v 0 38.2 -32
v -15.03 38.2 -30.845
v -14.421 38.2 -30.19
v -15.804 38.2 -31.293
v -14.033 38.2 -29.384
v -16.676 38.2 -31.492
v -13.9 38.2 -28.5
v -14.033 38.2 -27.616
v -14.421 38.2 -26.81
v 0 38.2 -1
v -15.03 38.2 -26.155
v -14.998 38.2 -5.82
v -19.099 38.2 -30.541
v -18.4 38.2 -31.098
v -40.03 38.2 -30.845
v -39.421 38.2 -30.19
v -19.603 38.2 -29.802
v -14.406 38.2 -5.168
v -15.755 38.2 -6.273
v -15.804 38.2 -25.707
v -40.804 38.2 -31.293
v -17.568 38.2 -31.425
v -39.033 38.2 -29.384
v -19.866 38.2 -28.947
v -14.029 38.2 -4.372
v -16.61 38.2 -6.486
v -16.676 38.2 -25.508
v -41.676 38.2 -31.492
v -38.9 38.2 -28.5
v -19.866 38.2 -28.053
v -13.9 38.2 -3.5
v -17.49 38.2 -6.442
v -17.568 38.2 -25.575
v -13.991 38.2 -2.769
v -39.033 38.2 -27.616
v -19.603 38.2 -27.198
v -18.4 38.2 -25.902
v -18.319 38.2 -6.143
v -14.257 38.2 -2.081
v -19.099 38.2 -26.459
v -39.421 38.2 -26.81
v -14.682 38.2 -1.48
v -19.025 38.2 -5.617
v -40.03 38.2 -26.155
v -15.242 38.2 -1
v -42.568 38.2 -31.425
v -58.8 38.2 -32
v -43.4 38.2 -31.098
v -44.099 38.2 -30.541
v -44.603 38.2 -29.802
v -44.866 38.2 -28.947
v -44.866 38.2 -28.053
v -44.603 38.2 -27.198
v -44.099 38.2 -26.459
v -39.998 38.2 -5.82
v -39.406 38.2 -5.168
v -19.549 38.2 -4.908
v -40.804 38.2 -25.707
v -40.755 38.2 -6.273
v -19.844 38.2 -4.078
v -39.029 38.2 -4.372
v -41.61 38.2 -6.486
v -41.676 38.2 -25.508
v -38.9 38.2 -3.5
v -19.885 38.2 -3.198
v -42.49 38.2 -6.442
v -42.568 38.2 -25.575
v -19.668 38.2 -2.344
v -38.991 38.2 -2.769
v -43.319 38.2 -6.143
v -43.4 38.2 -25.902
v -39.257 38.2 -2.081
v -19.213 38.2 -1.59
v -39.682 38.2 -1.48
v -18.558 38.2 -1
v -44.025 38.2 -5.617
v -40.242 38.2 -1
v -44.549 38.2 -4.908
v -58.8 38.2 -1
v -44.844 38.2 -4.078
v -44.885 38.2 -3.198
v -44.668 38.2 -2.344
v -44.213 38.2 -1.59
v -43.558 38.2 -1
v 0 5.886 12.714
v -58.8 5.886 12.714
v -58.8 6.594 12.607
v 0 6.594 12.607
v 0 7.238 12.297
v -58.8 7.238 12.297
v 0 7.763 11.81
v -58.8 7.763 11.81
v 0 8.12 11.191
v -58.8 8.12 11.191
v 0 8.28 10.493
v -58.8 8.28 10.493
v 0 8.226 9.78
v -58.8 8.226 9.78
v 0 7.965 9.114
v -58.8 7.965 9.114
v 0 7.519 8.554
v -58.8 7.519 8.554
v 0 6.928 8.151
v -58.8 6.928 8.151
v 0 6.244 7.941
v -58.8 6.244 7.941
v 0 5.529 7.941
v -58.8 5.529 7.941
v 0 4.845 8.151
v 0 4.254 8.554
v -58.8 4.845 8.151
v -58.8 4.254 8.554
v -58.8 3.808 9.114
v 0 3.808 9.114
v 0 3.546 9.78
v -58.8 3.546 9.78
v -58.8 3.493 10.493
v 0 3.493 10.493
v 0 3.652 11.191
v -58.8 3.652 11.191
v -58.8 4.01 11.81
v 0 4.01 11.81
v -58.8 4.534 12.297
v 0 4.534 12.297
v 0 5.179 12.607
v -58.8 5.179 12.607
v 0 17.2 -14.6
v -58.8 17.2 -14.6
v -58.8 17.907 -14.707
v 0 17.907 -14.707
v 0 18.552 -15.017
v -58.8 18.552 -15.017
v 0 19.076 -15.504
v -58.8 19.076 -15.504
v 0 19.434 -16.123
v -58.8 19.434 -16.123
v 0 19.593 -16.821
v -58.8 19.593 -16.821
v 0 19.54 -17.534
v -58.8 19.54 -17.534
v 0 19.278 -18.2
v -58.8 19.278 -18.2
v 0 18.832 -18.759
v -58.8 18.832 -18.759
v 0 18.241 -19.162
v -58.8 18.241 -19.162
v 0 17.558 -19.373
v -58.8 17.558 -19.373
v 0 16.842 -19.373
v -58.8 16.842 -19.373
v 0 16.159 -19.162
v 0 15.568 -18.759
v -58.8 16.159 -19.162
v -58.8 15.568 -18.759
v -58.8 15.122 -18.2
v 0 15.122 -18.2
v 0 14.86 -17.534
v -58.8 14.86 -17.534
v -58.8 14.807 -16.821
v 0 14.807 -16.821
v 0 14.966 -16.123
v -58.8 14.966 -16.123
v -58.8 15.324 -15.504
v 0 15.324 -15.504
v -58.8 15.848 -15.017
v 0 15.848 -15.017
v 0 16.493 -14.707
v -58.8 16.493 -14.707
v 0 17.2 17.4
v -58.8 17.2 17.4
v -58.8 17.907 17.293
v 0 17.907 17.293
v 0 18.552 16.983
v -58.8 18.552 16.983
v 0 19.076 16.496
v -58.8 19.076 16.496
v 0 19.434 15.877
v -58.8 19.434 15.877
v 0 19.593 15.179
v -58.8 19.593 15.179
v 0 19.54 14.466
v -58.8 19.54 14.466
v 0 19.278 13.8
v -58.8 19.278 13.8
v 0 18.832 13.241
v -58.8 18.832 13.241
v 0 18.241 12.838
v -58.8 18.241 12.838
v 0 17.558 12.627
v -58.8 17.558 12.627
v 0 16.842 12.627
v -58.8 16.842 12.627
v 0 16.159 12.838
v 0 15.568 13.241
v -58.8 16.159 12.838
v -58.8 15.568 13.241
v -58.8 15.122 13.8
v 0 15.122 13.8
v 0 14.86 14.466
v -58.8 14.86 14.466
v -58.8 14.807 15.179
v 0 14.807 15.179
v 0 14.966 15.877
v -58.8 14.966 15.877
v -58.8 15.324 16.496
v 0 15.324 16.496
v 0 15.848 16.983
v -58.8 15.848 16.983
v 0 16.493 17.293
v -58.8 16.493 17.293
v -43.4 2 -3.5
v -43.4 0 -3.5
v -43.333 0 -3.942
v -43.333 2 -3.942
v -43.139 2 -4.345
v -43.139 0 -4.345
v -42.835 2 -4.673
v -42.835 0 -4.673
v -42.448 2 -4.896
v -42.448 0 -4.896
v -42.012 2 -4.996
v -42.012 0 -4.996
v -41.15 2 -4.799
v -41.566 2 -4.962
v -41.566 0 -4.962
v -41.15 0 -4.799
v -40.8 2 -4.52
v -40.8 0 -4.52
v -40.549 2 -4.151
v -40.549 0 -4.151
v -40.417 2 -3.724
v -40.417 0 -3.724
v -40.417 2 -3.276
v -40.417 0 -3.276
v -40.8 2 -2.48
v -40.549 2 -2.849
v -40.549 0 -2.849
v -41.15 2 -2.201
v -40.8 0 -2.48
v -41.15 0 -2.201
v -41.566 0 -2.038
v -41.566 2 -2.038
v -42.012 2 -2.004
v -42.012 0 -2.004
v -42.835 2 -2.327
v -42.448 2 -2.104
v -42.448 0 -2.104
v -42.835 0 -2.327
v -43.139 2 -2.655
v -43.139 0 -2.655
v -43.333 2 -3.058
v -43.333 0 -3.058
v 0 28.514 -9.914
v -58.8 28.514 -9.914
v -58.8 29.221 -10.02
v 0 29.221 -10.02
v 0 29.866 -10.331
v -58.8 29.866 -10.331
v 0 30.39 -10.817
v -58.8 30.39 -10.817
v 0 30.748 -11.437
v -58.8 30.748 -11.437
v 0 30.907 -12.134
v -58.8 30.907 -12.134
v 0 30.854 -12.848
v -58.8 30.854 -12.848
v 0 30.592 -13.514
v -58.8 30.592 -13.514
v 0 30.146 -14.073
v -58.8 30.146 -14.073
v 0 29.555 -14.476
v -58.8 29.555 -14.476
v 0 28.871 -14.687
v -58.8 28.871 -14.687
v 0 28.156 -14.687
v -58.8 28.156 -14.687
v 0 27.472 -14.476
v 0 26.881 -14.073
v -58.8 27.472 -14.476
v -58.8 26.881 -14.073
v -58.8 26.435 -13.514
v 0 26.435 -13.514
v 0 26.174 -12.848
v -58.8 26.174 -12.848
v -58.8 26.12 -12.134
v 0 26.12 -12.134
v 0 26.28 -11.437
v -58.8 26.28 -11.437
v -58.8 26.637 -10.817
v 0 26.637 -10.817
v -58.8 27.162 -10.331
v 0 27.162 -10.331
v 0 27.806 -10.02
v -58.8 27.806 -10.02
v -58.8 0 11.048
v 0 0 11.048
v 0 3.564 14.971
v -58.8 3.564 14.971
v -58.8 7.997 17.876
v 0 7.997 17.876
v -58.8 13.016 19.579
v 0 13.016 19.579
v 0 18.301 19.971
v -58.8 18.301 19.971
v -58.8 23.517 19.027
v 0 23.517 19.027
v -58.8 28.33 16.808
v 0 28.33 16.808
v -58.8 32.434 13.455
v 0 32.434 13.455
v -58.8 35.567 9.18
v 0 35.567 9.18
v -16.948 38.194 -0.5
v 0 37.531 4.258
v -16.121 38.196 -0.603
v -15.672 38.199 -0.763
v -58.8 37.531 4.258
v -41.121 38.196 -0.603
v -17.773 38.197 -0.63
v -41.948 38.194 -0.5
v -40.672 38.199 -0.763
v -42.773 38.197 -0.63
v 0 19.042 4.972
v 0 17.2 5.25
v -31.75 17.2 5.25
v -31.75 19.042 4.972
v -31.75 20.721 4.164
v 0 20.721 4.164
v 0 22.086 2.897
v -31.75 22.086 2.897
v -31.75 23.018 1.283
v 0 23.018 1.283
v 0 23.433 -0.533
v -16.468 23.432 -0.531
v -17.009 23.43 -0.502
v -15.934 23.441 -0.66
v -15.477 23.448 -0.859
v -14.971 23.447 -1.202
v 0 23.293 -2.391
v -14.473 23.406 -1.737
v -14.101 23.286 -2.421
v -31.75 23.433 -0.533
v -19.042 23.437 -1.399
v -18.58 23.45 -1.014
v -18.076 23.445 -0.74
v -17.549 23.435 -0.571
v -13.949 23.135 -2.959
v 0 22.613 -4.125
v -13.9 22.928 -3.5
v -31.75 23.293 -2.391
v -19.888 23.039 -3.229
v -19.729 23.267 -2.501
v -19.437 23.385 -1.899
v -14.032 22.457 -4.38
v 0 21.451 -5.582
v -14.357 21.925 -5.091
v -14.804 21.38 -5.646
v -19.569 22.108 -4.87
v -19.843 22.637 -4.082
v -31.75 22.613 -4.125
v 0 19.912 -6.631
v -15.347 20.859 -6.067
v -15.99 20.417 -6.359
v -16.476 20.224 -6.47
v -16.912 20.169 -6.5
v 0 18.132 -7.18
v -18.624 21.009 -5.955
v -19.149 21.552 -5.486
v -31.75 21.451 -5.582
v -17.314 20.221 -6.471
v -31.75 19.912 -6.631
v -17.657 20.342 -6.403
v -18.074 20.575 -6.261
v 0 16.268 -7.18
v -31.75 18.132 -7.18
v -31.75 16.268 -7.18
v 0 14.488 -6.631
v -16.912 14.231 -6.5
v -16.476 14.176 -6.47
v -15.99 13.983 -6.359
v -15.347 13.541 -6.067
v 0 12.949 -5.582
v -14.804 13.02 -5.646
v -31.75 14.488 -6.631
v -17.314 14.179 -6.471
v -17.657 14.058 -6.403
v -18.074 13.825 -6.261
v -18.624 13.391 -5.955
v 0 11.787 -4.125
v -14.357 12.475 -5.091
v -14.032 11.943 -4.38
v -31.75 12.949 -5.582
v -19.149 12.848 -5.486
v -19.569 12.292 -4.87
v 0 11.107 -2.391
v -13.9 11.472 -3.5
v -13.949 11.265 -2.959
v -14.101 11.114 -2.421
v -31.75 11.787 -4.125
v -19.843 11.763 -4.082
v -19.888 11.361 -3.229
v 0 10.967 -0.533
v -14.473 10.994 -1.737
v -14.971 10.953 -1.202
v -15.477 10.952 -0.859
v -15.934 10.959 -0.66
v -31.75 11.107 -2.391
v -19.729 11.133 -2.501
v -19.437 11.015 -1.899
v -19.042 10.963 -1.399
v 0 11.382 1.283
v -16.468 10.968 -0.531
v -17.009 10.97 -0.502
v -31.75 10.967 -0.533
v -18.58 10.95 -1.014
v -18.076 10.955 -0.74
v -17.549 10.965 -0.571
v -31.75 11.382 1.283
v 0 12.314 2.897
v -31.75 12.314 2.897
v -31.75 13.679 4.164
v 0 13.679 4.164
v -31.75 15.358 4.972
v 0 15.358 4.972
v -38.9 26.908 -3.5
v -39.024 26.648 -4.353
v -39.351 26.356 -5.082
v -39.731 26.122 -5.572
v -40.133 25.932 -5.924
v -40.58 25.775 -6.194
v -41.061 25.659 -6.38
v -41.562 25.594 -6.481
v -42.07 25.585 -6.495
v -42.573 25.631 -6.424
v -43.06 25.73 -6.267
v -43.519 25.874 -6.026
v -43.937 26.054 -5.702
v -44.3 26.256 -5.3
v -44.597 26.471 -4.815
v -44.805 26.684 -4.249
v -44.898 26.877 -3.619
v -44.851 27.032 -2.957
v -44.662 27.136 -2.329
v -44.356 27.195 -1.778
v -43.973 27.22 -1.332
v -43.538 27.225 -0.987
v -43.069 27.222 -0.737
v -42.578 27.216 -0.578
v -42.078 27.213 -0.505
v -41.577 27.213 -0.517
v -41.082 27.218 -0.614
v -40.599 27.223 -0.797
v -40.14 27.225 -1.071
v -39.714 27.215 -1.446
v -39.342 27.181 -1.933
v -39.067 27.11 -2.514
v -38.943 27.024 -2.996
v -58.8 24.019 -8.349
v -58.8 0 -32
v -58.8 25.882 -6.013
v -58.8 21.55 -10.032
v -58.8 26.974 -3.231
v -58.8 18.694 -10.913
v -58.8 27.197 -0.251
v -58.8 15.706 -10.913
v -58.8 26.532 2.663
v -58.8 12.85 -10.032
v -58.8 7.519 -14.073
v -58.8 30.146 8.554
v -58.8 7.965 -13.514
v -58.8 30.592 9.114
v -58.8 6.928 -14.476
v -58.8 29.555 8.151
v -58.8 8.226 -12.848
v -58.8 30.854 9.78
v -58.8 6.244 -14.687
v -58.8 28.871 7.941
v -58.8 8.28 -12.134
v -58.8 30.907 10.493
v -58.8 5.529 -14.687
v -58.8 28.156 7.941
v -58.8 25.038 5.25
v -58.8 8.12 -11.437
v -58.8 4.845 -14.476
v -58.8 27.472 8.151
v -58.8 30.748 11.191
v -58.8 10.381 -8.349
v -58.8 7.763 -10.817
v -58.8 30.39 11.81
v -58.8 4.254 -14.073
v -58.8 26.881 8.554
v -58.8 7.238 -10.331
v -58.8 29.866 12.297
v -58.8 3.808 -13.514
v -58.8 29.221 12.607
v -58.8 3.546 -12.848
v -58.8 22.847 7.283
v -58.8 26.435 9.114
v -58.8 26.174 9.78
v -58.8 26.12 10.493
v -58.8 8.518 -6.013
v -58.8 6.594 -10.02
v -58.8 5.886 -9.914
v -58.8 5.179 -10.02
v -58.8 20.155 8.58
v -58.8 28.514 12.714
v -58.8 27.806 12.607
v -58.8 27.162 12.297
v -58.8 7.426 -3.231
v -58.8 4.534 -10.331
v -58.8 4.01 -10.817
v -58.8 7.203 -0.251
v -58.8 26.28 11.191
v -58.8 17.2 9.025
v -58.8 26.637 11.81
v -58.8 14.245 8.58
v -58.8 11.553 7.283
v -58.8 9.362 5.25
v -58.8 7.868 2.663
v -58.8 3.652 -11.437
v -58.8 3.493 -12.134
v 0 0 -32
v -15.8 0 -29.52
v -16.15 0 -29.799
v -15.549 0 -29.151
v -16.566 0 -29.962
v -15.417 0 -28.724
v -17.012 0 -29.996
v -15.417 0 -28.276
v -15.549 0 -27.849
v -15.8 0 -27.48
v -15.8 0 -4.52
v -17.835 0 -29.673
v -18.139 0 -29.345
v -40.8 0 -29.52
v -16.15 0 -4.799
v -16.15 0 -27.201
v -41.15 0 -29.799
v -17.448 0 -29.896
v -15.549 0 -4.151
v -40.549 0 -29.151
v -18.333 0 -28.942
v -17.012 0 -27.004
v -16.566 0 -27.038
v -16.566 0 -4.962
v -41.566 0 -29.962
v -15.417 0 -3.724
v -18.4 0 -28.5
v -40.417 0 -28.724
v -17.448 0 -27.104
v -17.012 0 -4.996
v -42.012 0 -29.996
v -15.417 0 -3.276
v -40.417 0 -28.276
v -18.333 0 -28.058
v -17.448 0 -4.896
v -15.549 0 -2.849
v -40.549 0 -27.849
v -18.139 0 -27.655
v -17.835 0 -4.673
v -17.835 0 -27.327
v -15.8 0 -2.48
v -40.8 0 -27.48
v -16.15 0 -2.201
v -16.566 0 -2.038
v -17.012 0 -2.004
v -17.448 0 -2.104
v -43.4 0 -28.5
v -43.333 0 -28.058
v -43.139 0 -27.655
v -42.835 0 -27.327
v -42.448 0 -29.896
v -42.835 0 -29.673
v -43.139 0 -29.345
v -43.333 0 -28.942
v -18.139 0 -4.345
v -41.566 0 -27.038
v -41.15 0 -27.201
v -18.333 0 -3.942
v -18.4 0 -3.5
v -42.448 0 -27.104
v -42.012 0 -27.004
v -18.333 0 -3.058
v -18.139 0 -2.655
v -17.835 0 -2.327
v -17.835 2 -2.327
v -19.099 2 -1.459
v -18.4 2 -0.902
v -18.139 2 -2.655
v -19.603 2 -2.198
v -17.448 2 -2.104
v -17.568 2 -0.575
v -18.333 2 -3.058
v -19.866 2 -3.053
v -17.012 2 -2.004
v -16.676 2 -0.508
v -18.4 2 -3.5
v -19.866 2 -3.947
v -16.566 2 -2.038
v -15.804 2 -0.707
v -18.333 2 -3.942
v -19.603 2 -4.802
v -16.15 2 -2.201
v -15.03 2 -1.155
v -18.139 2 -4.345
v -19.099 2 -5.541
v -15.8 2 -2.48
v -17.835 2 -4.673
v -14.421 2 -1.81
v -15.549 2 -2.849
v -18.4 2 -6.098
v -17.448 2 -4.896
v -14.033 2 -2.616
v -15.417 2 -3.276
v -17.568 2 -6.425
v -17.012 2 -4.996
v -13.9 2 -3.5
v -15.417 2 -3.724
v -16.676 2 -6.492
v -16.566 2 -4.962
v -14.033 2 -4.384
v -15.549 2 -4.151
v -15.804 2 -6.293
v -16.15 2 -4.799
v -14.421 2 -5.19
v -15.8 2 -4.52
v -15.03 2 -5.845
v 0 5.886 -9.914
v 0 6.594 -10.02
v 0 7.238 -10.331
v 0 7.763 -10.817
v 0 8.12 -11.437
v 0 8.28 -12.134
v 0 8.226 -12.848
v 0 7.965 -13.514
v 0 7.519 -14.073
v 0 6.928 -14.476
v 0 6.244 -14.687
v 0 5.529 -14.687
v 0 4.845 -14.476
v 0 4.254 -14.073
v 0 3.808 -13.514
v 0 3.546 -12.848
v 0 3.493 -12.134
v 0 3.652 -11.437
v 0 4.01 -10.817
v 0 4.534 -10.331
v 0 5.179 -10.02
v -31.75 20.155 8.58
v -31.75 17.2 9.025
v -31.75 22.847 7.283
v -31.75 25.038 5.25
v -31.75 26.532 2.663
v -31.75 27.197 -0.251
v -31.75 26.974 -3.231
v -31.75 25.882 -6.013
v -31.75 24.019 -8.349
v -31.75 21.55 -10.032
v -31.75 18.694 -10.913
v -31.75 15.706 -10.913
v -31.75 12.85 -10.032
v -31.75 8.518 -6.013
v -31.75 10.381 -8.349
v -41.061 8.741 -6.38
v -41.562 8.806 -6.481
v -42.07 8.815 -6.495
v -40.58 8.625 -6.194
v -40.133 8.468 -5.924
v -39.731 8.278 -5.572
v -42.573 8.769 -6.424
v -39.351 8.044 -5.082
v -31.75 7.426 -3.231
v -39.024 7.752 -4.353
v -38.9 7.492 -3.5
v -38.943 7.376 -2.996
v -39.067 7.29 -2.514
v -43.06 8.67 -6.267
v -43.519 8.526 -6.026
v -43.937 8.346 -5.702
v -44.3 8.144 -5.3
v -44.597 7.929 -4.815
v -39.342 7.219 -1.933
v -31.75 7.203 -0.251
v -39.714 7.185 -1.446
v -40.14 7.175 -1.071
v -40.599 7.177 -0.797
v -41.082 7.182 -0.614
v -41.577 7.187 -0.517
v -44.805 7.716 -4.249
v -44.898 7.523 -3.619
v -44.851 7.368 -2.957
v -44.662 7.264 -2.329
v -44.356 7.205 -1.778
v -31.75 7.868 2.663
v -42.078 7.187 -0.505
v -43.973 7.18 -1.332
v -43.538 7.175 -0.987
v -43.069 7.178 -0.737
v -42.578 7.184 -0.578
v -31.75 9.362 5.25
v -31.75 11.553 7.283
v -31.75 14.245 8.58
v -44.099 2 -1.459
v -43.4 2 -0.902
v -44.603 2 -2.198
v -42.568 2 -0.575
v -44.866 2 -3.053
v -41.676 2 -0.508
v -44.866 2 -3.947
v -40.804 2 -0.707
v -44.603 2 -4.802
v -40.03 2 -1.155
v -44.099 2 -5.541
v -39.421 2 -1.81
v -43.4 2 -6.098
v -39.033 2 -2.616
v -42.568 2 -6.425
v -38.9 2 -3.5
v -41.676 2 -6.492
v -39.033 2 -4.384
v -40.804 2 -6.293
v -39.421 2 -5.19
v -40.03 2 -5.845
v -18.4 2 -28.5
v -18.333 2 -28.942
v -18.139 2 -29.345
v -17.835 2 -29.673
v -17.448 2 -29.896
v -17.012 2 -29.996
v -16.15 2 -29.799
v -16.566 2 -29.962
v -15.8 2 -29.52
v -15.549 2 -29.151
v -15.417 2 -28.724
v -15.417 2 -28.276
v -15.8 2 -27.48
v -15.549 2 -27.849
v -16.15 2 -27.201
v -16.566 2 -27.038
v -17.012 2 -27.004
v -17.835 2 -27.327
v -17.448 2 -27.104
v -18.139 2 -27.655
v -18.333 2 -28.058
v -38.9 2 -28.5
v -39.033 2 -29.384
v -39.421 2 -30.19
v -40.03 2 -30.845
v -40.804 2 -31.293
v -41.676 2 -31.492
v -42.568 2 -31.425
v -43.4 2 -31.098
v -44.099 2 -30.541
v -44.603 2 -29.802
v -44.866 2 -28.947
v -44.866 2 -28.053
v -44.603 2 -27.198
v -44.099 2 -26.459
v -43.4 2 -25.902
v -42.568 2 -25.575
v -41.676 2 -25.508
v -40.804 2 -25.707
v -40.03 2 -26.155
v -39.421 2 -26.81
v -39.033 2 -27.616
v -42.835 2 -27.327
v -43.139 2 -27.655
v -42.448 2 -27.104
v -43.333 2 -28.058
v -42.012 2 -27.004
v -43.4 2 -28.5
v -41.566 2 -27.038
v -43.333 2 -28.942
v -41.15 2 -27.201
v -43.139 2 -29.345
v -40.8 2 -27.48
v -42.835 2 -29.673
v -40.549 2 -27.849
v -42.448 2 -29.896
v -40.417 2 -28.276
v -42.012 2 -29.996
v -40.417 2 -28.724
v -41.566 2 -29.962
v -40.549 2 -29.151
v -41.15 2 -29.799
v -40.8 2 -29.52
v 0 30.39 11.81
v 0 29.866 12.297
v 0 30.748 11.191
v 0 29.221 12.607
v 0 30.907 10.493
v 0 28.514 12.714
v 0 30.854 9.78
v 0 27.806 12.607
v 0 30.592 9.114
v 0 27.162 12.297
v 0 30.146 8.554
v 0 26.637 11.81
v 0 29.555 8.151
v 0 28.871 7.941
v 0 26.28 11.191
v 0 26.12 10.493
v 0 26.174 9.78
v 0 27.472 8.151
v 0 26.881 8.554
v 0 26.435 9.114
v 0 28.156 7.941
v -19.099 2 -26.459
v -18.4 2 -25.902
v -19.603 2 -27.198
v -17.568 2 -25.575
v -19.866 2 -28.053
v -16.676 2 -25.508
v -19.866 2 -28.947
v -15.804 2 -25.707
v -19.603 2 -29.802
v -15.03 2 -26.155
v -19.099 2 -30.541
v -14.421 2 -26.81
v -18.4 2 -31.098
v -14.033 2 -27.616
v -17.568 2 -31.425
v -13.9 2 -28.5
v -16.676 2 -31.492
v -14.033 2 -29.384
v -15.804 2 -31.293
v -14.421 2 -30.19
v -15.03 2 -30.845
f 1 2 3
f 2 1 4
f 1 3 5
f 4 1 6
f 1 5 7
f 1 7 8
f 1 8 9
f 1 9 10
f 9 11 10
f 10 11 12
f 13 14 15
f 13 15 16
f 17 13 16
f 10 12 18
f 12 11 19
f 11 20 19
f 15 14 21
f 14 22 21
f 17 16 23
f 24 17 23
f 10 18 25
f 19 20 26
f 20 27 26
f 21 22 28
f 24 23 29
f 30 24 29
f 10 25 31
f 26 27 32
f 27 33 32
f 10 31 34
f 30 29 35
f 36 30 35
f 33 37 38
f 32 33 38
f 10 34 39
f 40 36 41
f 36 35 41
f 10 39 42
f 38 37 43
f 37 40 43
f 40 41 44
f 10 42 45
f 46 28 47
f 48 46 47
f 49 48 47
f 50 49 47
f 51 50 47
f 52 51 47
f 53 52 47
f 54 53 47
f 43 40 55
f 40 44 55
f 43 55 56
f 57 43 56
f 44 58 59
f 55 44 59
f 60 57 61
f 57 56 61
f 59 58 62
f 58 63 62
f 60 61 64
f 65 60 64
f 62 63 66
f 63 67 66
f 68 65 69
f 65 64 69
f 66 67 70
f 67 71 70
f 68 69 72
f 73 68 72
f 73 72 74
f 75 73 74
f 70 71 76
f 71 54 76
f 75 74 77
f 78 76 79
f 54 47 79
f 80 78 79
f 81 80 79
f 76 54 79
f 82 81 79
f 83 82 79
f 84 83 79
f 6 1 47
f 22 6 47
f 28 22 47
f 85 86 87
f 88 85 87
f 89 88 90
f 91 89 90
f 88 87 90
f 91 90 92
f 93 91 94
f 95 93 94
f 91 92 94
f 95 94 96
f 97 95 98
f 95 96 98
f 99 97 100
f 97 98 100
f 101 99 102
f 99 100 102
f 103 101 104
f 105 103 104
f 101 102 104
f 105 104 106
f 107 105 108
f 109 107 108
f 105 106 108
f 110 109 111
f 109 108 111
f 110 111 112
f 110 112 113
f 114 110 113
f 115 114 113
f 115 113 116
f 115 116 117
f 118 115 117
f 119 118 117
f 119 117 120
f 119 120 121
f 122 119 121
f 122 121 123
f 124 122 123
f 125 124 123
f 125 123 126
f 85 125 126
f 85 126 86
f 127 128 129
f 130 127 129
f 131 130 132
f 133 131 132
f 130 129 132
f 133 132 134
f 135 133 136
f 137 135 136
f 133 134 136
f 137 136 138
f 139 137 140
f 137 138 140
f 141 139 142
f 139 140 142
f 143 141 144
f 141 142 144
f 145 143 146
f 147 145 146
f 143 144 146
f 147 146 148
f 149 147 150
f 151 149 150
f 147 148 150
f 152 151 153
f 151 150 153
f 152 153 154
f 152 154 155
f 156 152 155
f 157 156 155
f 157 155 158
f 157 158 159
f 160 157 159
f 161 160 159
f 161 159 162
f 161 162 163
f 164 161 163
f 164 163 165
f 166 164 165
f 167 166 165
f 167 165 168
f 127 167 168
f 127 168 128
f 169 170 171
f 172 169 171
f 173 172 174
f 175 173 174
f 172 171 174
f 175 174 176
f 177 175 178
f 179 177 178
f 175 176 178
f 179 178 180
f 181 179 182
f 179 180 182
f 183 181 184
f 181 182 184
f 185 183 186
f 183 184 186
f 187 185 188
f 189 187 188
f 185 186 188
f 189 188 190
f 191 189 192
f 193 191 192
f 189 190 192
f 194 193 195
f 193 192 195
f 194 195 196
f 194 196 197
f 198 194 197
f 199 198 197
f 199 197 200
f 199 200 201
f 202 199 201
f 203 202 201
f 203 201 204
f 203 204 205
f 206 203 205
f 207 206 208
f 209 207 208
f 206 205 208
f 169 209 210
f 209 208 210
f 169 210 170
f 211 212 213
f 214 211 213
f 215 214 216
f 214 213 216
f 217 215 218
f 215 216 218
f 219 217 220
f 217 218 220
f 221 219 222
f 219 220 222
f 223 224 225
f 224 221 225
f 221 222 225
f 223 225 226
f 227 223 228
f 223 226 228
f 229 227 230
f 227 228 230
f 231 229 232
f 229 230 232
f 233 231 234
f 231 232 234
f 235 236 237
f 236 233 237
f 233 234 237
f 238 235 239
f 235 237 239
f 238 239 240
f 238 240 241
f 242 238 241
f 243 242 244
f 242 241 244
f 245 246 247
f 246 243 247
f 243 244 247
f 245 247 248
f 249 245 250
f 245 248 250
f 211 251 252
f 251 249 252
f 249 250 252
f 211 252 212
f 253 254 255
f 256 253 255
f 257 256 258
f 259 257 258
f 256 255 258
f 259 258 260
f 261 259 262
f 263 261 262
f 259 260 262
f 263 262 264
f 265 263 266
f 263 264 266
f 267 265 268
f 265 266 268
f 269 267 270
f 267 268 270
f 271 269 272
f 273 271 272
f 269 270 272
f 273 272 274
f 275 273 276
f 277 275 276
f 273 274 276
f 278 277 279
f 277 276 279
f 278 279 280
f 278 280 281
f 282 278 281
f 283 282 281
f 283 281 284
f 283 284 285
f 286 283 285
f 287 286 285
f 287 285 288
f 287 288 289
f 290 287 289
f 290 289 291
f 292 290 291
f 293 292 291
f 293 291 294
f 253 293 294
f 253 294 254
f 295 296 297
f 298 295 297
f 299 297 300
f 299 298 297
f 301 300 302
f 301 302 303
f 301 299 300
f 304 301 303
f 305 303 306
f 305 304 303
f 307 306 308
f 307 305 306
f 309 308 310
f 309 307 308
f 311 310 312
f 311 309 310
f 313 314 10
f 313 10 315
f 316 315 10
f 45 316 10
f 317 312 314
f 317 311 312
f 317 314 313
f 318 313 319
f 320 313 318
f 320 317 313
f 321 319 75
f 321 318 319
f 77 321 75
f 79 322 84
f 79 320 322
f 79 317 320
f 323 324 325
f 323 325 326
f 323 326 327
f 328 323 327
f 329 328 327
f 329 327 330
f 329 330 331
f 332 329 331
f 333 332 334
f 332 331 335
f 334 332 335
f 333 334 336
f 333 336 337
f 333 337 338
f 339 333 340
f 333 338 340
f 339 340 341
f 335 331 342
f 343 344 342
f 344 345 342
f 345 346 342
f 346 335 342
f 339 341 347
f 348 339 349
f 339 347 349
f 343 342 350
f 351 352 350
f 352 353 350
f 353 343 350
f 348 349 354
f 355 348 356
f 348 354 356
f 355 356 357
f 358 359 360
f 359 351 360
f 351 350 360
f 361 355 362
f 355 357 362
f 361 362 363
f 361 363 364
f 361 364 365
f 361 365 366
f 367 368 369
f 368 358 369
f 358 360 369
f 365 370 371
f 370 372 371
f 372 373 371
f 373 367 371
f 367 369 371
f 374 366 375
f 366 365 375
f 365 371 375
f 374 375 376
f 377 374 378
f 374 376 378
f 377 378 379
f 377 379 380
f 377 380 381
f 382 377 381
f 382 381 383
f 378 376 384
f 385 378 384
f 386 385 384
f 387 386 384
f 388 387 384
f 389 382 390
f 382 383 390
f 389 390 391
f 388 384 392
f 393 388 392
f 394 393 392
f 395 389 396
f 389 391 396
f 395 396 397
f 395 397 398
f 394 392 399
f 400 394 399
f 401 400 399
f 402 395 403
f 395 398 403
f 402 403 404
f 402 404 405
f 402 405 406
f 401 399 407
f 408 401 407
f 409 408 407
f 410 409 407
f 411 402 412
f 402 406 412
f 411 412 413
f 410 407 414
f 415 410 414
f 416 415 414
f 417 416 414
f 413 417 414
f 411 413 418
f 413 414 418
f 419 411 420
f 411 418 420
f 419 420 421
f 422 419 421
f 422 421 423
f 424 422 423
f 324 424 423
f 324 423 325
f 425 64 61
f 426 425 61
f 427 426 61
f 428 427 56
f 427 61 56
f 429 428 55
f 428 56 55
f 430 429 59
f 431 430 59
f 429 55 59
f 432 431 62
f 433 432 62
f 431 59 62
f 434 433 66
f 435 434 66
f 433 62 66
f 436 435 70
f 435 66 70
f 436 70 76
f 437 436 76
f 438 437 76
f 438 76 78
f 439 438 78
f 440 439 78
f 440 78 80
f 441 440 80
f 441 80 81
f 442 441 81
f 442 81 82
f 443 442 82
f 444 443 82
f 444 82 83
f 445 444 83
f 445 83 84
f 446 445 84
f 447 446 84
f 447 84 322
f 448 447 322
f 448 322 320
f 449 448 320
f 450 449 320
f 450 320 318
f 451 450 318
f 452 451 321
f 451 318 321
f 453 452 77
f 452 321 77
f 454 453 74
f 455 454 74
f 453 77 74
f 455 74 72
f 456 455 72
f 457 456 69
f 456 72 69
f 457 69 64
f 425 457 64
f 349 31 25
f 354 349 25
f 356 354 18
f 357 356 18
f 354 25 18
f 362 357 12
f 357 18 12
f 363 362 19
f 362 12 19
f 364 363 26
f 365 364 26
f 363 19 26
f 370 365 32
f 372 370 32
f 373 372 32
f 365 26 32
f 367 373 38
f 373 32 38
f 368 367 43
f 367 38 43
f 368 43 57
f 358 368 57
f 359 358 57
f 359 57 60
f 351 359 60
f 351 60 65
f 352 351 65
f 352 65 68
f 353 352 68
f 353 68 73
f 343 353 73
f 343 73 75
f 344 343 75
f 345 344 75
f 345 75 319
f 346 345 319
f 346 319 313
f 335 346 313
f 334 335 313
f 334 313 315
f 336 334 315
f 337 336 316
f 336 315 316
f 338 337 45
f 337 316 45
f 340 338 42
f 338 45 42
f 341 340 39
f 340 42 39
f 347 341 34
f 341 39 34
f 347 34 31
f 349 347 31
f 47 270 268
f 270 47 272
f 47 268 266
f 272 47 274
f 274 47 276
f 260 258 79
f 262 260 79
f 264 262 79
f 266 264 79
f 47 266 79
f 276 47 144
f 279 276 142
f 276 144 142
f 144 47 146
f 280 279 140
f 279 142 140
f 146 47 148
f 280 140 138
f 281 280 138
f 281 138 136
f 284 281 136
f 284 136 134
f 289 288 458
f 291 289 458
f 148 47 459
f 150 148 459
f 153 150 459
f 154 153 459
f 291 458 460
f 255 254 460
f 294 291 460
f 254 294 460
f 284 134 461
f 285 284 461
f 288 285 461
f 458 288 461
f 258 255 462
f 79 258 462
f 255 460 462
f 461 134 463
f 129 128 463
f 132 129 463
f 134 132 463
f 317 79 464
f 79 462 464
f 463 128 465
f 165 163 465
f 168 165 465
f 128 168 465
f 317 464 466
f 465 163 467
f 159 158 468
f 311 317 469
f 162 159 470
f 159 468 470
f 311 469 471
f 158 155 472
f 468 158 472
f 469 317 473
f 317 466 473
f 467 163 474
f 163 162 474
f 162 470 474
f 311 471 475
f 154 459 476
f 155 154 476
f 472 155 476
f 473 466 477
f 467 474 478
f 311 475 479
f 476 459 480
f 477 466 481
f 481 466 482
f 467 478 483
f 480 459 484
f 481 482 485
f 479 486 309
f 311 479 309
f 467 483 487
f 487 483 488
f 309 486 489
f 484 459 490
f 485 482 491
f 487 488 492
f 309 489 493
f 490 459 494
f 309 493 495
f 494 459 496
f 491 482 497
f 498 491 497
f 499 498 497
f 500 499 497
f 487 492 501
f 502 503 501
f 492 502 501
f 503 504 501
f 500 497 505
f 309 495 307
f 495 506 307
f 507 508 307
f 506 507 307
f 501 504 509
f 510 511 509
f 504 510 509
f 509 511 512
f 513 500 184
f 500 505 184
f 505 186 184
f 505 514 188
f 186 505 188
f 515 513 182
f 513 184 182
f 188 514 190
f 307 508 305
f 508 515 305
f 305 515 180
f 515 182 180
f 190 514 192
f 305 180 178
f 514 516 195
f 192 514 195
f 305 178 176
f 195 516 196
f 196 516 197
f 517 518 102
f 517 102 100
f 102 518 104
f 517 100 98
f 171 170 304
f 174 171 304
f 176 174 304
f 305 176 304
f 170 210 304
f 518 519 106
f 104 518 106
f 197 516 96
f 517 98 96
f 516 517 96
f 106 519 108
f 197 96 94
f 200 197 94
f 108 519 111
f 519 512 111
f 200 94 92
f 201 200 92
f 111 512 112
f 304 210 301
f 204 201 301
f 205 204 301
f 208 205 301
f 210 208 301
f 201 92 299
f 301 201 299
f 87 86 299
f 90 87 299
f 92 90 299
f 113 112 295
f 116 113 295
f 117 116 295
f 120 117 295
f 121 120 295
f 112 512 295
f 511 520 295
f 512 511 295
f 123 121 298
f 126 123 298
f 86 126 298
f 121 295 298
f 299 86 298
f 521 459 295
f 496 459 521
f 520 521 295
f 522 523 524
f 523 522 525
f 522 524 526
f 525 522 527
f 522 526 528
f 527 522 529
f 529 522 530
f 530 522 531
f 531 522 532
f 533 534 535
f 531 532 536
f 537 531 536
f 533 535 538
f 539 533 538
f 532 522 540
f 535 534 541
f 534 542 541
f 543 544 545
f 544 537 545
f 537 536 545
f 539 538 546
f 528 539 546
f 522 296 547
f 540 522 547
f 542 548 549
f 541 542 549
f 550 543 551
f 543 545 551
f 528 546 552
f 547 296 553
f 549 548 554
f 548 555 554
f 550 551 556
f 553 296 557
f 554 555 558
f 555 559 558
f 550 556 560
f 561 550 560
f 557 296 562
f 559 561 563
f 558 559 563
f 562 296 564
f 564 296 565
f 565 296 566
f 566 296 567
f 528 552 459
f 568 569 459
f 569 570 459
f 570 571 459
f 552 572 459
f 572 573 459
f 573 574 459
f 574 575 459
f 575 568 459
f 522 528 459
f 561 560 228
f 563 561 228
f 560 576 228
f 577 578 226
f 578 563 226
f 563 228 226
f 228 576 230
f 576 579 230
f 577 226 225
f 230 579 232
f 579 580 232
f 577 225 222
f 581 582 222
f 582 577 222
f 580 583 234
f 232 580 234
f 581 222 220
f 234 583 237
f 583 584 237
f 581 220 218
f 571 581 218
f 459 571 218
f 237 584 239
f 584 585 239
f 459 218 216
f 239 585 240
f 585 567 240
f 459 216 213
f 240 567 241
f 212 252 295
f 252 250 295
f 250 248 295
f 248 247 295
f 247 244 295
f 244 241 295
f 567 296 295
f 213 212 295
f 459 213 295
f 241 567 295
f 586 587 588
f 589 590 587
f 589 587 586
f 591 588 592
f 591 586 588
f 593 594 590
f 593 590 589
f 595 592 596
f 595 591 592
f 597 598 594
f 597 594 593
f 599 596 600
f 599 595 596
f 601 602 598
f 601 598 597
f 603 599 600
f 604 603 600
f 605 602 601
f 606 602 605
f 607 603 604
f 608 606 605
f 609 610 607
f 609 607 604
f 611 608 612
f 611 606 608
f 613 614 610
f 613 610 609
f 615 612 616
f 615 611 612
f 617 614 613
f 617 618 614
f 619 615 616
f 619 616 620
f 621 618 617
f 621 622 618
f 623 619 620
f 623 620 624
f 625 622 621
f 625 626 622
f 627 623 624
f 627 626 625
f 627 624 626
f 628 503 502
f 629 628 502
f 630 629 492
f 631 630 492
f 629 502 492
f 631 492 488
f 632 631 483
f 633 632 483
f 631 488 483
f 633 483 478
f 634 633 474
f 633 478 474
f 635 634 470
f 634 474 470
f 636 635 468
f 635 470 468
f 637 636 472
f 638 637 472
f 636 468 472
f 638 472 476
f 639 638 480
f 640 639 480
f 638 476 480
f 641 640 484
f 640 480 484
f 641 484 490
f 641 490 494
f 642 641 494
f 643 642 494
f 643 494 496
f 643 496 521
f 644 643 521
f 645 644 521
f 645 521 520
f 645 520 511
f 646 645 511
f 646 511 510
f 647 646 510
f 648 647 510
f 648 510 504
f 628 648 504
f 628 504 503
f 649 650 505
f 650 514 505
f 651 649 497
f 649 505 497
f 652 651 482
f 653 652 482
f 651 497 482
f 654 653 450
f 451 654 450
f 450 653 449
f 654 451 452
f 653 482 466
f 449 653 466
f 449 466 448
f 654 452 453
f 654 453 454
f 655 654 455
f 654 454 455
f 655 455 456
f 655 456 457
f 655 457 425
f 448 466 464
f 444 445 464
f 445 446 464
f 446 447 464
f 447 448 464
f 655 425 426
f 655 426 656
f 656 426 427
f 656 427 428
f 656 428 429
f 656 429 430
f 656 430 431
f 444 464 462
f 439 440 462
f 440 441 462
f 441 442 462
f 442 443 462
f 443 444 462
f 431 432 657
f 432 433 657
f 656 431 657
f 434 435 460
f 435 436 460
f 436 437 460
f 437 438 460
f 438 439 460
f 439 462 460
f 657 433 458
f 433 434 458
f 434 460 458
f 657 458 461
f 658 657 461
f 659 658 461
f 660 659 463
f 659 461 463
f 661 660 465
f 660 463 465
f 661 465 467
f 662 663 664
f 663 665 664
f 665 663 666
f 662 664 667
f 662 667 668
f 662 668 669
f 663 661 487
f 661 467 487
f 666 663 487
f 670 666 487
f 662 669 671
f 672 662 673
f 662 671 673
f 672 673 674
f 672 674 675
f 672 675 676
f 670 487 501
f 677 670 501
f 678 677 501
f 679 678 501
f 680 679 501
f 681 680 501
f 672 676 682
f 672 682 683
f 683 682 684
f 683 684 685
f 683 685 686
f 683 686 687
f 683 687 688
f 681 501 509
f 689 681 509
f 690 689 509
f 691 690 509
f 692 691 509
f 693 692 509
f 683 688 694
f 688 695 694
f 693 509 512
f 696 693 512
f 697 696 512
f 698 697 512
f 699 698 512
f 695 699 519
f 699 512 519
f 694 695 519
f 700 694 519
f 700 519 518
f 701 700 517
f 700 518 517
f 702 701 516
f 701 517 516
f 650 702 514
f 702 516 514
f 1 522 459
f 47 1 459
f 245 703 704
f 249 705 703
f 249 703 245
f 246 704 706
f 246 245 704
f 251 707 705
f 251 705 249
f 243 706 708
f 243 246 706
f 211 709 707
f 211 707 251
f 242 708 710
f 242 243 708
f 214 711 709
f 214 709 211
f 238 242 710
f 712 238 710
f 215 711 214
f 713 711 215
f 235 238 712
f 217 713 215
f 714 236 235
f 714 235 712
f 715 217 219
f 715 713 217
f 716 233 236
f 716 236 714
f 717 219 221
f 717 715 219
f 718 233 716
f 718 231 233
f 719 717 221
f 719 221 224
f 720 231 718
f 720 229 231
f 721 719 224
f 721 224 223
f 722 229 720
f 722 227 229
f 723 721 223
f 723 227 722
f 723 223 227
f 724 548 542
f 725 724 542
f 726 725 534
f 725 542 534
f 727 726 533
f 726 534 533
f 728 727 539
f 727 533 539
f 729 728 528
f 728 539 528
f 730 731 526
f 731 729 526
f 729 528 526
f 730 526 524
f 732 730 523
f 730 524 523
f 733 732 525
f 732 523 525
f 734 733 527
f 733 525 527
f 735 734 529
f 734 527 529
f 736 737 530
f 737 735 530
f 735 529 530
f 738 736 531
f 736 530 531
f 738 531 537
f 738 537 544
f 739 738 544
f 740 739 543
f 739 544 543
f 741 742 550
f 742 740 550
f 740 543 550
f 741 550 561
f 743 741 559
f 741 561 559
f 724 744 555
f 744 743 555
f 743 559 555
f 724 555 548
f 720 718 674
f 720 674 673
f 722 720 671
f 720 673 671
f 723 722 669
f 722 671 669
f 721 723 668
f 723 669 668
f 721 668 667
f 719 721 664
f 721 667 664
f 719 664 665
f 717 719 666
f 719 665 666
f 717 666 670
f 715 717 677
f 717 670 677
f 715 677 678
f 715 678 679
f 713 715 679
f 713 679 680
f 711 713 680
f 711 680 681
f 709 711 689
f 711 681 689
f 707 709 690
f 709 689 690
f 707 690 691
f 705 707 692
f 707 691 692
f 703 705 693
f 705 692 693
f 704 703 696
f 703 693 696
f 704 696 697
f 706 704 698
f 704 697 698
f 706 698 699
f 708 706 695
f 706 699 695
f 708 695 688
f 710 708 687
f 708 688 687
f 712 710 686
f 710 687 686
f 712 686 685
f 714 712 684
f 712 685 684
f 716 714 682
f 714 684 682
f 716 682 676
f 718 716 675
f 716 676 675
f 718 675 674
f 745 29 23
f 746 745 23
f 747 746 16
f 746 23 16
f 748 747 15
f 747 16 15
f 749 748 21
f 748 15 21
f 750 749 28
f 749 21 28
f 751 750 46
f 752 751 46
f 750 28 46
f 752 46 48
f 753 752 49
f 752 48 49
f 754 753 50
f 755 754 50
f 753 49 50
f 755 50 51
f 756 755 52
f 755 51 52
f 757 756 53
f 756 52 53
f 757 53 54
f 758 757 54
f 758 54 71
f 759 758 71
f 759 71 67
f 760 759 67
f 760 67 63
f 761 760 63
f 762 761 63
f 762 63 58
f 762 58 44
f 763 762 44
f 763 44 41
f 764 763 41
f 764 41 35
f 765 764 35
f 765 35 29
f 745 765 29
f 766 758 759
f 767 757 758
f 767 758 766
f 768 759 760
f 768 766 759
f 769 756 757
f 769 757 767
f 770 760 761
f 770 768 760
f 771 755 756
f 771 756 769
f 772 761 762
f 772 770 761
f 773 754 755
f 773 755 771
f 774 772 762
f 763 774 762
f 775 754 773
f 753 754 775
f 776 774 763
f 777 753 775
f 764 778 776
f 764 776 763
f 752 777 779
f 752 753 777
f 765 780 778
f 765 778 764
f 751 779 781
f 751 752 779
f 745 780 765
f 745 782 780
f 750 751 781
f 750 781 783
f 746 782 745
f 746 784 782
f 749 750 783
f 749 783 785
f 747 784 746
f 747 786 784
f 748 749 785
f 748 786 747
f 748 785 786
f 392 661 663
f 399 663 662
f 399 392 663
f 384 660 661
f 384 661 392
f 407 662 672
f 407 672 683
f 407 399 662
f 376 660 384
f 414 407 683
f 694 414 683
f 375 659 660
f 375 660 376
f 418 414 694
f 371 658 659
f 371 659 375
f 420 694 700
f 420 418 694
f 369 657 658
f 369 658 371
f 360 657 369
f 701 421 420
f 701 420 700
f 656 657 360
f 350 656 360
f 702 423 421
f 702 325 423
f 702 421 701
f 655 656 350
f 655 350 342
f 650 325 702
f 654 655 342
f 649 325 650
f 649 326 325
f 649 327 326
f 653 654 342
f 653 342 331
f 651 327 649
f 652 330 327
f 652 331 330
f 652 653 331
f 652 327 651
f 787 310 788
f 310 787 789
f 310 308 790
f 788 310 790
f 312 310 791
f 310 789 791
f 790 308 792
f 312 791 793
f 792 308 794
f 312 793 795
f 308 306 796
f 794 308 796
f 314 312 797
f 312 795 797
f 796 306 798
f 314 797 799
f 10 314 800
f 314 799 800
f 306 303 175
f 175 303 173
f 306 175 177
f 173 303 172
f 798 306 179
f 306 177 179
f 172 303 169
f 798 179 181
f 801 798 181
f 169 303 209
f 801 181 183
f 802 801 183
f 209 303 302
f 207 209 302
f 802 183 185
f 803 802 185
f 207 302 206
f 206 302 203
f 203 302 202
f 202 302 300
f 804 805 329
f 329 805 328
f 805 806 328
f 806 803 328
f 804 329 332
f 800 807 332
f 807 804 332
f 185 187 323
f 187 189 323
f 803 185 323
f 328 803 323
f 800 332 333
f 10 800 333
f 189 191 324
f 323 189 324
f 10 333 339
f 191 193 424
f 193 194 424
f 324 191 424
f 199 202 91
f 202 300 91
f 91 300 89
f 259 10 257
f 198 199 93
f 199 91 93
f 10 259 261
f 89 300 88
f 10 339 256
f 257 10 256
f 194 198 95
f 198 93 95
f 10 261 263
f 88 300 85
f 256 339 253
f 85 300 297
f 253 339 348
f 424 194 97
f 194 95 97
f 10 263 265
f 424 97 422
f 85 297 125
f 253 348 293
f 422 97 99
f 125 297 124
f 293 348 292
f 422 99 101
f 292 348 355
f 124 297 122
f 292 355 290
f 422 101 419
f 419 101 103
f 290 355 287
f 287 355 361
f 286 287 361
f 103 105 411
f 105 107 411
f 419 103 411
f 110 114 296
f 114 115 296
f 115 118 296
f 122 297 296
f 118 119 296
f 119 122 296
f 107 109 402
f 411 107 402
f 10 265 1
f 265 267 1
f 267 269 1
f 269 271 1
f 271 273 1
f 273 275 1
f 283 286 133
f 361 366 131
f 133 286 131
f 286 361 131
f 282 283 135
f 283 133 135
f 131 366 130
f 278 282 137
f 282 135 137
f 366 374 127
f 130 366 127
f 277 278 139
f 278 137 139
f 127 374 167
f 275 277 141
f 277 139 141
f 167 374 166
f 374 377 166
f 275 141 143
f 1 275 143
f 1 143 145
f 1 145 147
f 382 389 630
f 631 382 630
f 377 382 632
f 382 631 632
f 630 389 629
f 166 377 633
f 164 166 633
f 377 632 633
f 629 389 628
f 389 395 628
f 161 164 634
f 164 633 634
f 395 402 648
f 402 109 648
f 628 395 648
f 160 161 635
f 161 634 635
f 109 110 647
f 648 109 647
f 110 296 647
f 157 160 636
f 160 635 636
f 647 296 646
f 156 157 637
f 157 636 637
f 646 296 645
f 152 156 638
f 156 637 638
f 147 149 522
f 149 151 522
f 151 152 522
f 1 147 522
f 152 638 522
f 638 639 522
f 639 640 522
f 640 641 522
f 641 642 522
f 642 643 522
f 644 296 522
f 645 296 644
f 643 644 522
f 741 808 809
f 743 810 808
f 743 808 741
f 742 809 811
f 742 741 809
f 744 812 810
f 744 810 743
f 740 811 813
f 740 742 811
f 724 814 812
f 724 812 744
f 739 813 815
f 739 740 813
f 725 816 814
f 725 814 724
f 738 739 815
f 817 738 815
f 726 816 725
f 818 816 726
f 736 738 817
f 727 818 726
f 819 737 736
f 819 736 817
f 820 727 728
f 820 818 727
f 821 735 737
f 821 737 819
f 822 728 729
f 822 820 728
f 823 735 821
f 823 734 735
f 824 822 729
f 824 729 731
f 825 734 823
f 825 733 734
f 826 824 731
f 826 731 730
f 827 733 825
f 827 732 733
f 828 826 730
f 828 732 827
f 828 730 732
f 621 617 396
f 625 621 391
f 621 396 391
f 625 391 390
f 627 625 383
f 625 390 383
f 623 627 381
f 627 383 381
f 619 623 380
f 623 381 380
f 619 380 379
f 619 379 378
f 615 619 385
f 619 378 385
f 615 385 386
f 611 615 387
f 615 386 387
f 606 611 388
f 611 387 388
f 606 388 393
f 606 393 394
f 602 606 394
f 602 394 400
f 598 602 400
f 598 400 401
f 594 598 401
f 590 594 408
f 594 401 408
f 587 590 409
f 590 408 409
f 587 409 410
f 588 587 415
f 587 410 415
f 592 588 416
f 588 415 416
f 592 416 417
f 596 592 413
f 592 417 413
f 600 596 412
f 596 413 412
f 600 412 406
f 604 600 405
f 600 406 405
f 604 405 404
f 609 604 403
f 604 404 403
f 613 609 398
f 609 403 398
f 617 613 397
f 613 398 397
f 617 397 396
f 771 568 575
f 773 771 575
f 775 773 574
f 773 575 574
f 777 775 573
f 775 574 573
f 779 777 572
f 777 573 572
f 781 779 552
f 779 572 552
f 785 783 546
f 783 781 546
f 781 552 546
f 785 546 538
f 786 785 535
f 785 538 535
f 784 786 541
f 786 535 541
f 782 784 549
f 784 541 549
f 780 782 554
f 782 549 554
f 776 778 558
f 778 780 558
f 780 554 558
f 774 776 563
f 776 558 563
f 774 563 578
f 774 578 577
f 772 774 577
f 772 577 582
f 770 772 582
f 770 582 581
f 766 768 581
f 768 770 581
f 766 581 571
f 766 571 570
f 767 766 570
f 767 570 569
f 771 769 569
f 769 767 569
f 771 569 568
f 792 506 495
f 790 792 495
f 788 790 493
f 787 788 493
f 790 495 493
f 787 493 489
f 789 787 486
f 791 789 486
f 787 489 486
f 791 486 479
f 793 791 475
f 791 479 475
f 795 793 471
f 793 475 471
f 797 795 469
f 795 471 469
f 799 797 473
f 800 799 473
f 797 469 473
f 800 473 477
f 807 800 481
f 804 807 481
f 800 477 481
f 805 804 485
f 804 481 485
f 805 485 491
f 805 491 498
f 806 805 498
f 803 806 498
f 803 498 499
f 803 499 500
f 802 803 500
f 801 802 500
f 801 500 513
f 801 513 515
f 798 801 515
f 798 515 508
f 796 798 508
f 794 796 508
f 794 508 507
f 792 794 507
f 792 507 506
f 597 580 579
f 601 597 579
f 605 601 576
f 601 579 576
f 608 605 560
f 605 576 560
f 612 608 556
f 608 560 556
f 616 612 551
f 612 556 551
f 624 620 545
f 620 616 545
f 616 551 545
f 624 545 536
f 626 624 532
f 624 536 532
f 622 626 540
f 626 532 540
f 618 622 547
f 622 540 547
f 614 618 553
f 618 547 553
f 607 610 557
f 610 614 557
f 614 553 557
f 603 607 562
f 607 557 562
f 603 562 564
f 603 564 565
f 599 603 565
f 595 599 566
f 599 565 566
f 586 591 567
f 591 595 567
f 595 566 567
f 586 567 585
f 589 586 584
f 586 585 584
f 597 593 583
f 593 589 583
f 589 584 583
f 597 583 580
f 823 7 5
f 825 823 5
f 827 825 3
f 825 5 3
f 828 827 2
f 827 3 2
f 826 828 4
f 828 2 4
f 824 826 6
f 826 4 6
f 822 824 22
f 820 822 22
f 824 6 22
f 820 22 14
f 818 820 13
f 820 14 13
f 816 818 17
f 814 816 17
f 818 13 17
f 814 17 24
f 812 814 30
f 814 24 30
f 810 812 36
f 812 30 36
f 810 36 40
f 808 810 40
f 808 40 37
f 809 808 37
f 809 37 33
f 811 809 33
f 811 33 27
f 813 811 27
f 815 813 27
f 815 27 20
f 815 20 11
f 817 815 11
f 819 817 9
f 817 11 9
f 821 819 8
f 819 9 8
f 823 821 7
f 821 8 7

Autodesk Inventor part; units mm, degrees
ref_plane "YZ Plane" through (0, 0, 0) normal (1, 0, 0) x (0, 1, 0)
ref_plane "XZ Plane" through (0, 0, 0) normal (0, 1, 0) x (-1, 0, 0)
ref_plane "XY Plane" through (0, 0, 0) normal (0, 0, 1) x (1, 0, 0)
sketch "Sketch1" plane through (0, 0, 0) normal (0, 1, 0) x (-1, 0, 0)
  line L0 (58.8, 0) -> (0, 0)
  line L1 (0, 0) -> (0, -32)
  line L2 (0, -32) -> (58.8, -32)
  line L3 (58.8, -32) -> (58.8, 0)
  line L4 (41.9, -3.5) -> (16.9, -3.5) construction
  line L5 (16.9, -3.5) -> (16.9, -28.5) construction
  line L6 (16.9, -28.5) -> (41.9, -28.5) construction
  line L7 (41.9, -28.5) -> (41.9, -3.5) construction
  circle A0 centre (41.9, -3.5) radius 1.5
  circle A1 centre (16.9, -3.5) radius 1.5
  circle A2 centre (41.9, -28.5) radius 1.5
  circle A3 centre (16.9, -28.5) radius 1.5
  point P0 (41.9, -16)
  point P1 (58.8, -16)
  point P2 (29.4, -28.5)
  point P3 (29.4, -32)
  dimension "d0" = 3
  dimension "d1" = 25
  dimension "d2" = 32
  dimension "d3" = 58.8
extrude "Extrusion1" add sketch "Sketch1" along normal blind 2
sketch "Sketch2" plane through (-58.8, 0, -32) normal (-1, 0, 0) x (0, 0, 1)
  circle A0 centre (31, 17.2) radius 16 construction
  circle A1 centre (42.3137, 28.5137) radius 2.4
  circle A2 centre (15, 17.2) radius 2.4
  circle A3 centre (19.6863, 5.8863) radius 2.4
  circle A4 centre (19.6863, 28.5137) radius 2.4
  circle A5 centre (47, 17.2) radius 2.4
  circle A6 centre (42.3137, 5.8863) radius 2.4
  line L0 (19.6863, 28.5137) -> (42.3137, 5.8863) construction
  line L1 (15, 17.2) -> (31, 17.2) construction
  line L2 (0, 2) -> (32, 2) projected
  arc A7 (43.0482, 0) -> (16.51, 2) centre (31, 17.2) ccw
  line L3 (0, 0) -> (32, 0) projected
  line L4 (32, 0) -> (43.0482, 0)
  line L5 (32, 0) -> (32, 2) projected
  line L6 (0, 2) -> (0, 38.2)
  line L7 (0, 38.2) -> (31, 38.2)
  circle A8 centre (31, 17.2) radius 6.25
  point P0 (31, 17.2)
  dimension "d6" = 4.8
  dimension "d7" = 32
  dimension "d9" = 15.2
  dimension "d11" = 45
  dimension "d12" = 31
  dimension "d14" = 21
  dimension "d17" = 12.5
extrude "Extrusion2" add sketch "Sketch2" against normal up to surface (58.8 mm away)
sketch "Sketch3" plane through (-58.8, 0, -32) normal (-1, 0, 0) x (0, 0, 1)
  circle A0 centre (31, 17.2) radius 10.025
  circle A1 centre (31, 17.2) radius 6.25 construction
  point P0 (32, 0)
  dimension "d18" = 20.05
extrude "Extrusion3" cut sketch "Sketch3" against normal blind 27.05
sketch "Sketch4" plane through (-58.8, 38.2, -1) normal (0, 1, 0) x (1, 0, 0)
  circle A0 centre (41.9, 2.5) radius 1.5 projected
  circle A1 centre (41.9, 27.5) radius 1.5 projected
  circle A2 centre (16.9, 2.5) radius 1.5 projected
  circle A3 centre (16.9, 27.5) radius 1.5 projected
  circle A4 centre (16.9, 2.5) radius 3
  circle A5 centre (16.9, 27.5) radius 3
  circle A6 centre (41.9, 27.5) radius 3
  circle A7 centre (41.9, 2.5) radius 3
  point P0 (58.8, -1)
  dimension "d21" = 6
extrude "Extrusion4" cut sketch "Sketch4" against normal up to surface (36.2 mm away) contours A0 | A1 | A2 | A3 | A4 | A5 | A6 | A7
properties part number "X_Axis_Connector"
